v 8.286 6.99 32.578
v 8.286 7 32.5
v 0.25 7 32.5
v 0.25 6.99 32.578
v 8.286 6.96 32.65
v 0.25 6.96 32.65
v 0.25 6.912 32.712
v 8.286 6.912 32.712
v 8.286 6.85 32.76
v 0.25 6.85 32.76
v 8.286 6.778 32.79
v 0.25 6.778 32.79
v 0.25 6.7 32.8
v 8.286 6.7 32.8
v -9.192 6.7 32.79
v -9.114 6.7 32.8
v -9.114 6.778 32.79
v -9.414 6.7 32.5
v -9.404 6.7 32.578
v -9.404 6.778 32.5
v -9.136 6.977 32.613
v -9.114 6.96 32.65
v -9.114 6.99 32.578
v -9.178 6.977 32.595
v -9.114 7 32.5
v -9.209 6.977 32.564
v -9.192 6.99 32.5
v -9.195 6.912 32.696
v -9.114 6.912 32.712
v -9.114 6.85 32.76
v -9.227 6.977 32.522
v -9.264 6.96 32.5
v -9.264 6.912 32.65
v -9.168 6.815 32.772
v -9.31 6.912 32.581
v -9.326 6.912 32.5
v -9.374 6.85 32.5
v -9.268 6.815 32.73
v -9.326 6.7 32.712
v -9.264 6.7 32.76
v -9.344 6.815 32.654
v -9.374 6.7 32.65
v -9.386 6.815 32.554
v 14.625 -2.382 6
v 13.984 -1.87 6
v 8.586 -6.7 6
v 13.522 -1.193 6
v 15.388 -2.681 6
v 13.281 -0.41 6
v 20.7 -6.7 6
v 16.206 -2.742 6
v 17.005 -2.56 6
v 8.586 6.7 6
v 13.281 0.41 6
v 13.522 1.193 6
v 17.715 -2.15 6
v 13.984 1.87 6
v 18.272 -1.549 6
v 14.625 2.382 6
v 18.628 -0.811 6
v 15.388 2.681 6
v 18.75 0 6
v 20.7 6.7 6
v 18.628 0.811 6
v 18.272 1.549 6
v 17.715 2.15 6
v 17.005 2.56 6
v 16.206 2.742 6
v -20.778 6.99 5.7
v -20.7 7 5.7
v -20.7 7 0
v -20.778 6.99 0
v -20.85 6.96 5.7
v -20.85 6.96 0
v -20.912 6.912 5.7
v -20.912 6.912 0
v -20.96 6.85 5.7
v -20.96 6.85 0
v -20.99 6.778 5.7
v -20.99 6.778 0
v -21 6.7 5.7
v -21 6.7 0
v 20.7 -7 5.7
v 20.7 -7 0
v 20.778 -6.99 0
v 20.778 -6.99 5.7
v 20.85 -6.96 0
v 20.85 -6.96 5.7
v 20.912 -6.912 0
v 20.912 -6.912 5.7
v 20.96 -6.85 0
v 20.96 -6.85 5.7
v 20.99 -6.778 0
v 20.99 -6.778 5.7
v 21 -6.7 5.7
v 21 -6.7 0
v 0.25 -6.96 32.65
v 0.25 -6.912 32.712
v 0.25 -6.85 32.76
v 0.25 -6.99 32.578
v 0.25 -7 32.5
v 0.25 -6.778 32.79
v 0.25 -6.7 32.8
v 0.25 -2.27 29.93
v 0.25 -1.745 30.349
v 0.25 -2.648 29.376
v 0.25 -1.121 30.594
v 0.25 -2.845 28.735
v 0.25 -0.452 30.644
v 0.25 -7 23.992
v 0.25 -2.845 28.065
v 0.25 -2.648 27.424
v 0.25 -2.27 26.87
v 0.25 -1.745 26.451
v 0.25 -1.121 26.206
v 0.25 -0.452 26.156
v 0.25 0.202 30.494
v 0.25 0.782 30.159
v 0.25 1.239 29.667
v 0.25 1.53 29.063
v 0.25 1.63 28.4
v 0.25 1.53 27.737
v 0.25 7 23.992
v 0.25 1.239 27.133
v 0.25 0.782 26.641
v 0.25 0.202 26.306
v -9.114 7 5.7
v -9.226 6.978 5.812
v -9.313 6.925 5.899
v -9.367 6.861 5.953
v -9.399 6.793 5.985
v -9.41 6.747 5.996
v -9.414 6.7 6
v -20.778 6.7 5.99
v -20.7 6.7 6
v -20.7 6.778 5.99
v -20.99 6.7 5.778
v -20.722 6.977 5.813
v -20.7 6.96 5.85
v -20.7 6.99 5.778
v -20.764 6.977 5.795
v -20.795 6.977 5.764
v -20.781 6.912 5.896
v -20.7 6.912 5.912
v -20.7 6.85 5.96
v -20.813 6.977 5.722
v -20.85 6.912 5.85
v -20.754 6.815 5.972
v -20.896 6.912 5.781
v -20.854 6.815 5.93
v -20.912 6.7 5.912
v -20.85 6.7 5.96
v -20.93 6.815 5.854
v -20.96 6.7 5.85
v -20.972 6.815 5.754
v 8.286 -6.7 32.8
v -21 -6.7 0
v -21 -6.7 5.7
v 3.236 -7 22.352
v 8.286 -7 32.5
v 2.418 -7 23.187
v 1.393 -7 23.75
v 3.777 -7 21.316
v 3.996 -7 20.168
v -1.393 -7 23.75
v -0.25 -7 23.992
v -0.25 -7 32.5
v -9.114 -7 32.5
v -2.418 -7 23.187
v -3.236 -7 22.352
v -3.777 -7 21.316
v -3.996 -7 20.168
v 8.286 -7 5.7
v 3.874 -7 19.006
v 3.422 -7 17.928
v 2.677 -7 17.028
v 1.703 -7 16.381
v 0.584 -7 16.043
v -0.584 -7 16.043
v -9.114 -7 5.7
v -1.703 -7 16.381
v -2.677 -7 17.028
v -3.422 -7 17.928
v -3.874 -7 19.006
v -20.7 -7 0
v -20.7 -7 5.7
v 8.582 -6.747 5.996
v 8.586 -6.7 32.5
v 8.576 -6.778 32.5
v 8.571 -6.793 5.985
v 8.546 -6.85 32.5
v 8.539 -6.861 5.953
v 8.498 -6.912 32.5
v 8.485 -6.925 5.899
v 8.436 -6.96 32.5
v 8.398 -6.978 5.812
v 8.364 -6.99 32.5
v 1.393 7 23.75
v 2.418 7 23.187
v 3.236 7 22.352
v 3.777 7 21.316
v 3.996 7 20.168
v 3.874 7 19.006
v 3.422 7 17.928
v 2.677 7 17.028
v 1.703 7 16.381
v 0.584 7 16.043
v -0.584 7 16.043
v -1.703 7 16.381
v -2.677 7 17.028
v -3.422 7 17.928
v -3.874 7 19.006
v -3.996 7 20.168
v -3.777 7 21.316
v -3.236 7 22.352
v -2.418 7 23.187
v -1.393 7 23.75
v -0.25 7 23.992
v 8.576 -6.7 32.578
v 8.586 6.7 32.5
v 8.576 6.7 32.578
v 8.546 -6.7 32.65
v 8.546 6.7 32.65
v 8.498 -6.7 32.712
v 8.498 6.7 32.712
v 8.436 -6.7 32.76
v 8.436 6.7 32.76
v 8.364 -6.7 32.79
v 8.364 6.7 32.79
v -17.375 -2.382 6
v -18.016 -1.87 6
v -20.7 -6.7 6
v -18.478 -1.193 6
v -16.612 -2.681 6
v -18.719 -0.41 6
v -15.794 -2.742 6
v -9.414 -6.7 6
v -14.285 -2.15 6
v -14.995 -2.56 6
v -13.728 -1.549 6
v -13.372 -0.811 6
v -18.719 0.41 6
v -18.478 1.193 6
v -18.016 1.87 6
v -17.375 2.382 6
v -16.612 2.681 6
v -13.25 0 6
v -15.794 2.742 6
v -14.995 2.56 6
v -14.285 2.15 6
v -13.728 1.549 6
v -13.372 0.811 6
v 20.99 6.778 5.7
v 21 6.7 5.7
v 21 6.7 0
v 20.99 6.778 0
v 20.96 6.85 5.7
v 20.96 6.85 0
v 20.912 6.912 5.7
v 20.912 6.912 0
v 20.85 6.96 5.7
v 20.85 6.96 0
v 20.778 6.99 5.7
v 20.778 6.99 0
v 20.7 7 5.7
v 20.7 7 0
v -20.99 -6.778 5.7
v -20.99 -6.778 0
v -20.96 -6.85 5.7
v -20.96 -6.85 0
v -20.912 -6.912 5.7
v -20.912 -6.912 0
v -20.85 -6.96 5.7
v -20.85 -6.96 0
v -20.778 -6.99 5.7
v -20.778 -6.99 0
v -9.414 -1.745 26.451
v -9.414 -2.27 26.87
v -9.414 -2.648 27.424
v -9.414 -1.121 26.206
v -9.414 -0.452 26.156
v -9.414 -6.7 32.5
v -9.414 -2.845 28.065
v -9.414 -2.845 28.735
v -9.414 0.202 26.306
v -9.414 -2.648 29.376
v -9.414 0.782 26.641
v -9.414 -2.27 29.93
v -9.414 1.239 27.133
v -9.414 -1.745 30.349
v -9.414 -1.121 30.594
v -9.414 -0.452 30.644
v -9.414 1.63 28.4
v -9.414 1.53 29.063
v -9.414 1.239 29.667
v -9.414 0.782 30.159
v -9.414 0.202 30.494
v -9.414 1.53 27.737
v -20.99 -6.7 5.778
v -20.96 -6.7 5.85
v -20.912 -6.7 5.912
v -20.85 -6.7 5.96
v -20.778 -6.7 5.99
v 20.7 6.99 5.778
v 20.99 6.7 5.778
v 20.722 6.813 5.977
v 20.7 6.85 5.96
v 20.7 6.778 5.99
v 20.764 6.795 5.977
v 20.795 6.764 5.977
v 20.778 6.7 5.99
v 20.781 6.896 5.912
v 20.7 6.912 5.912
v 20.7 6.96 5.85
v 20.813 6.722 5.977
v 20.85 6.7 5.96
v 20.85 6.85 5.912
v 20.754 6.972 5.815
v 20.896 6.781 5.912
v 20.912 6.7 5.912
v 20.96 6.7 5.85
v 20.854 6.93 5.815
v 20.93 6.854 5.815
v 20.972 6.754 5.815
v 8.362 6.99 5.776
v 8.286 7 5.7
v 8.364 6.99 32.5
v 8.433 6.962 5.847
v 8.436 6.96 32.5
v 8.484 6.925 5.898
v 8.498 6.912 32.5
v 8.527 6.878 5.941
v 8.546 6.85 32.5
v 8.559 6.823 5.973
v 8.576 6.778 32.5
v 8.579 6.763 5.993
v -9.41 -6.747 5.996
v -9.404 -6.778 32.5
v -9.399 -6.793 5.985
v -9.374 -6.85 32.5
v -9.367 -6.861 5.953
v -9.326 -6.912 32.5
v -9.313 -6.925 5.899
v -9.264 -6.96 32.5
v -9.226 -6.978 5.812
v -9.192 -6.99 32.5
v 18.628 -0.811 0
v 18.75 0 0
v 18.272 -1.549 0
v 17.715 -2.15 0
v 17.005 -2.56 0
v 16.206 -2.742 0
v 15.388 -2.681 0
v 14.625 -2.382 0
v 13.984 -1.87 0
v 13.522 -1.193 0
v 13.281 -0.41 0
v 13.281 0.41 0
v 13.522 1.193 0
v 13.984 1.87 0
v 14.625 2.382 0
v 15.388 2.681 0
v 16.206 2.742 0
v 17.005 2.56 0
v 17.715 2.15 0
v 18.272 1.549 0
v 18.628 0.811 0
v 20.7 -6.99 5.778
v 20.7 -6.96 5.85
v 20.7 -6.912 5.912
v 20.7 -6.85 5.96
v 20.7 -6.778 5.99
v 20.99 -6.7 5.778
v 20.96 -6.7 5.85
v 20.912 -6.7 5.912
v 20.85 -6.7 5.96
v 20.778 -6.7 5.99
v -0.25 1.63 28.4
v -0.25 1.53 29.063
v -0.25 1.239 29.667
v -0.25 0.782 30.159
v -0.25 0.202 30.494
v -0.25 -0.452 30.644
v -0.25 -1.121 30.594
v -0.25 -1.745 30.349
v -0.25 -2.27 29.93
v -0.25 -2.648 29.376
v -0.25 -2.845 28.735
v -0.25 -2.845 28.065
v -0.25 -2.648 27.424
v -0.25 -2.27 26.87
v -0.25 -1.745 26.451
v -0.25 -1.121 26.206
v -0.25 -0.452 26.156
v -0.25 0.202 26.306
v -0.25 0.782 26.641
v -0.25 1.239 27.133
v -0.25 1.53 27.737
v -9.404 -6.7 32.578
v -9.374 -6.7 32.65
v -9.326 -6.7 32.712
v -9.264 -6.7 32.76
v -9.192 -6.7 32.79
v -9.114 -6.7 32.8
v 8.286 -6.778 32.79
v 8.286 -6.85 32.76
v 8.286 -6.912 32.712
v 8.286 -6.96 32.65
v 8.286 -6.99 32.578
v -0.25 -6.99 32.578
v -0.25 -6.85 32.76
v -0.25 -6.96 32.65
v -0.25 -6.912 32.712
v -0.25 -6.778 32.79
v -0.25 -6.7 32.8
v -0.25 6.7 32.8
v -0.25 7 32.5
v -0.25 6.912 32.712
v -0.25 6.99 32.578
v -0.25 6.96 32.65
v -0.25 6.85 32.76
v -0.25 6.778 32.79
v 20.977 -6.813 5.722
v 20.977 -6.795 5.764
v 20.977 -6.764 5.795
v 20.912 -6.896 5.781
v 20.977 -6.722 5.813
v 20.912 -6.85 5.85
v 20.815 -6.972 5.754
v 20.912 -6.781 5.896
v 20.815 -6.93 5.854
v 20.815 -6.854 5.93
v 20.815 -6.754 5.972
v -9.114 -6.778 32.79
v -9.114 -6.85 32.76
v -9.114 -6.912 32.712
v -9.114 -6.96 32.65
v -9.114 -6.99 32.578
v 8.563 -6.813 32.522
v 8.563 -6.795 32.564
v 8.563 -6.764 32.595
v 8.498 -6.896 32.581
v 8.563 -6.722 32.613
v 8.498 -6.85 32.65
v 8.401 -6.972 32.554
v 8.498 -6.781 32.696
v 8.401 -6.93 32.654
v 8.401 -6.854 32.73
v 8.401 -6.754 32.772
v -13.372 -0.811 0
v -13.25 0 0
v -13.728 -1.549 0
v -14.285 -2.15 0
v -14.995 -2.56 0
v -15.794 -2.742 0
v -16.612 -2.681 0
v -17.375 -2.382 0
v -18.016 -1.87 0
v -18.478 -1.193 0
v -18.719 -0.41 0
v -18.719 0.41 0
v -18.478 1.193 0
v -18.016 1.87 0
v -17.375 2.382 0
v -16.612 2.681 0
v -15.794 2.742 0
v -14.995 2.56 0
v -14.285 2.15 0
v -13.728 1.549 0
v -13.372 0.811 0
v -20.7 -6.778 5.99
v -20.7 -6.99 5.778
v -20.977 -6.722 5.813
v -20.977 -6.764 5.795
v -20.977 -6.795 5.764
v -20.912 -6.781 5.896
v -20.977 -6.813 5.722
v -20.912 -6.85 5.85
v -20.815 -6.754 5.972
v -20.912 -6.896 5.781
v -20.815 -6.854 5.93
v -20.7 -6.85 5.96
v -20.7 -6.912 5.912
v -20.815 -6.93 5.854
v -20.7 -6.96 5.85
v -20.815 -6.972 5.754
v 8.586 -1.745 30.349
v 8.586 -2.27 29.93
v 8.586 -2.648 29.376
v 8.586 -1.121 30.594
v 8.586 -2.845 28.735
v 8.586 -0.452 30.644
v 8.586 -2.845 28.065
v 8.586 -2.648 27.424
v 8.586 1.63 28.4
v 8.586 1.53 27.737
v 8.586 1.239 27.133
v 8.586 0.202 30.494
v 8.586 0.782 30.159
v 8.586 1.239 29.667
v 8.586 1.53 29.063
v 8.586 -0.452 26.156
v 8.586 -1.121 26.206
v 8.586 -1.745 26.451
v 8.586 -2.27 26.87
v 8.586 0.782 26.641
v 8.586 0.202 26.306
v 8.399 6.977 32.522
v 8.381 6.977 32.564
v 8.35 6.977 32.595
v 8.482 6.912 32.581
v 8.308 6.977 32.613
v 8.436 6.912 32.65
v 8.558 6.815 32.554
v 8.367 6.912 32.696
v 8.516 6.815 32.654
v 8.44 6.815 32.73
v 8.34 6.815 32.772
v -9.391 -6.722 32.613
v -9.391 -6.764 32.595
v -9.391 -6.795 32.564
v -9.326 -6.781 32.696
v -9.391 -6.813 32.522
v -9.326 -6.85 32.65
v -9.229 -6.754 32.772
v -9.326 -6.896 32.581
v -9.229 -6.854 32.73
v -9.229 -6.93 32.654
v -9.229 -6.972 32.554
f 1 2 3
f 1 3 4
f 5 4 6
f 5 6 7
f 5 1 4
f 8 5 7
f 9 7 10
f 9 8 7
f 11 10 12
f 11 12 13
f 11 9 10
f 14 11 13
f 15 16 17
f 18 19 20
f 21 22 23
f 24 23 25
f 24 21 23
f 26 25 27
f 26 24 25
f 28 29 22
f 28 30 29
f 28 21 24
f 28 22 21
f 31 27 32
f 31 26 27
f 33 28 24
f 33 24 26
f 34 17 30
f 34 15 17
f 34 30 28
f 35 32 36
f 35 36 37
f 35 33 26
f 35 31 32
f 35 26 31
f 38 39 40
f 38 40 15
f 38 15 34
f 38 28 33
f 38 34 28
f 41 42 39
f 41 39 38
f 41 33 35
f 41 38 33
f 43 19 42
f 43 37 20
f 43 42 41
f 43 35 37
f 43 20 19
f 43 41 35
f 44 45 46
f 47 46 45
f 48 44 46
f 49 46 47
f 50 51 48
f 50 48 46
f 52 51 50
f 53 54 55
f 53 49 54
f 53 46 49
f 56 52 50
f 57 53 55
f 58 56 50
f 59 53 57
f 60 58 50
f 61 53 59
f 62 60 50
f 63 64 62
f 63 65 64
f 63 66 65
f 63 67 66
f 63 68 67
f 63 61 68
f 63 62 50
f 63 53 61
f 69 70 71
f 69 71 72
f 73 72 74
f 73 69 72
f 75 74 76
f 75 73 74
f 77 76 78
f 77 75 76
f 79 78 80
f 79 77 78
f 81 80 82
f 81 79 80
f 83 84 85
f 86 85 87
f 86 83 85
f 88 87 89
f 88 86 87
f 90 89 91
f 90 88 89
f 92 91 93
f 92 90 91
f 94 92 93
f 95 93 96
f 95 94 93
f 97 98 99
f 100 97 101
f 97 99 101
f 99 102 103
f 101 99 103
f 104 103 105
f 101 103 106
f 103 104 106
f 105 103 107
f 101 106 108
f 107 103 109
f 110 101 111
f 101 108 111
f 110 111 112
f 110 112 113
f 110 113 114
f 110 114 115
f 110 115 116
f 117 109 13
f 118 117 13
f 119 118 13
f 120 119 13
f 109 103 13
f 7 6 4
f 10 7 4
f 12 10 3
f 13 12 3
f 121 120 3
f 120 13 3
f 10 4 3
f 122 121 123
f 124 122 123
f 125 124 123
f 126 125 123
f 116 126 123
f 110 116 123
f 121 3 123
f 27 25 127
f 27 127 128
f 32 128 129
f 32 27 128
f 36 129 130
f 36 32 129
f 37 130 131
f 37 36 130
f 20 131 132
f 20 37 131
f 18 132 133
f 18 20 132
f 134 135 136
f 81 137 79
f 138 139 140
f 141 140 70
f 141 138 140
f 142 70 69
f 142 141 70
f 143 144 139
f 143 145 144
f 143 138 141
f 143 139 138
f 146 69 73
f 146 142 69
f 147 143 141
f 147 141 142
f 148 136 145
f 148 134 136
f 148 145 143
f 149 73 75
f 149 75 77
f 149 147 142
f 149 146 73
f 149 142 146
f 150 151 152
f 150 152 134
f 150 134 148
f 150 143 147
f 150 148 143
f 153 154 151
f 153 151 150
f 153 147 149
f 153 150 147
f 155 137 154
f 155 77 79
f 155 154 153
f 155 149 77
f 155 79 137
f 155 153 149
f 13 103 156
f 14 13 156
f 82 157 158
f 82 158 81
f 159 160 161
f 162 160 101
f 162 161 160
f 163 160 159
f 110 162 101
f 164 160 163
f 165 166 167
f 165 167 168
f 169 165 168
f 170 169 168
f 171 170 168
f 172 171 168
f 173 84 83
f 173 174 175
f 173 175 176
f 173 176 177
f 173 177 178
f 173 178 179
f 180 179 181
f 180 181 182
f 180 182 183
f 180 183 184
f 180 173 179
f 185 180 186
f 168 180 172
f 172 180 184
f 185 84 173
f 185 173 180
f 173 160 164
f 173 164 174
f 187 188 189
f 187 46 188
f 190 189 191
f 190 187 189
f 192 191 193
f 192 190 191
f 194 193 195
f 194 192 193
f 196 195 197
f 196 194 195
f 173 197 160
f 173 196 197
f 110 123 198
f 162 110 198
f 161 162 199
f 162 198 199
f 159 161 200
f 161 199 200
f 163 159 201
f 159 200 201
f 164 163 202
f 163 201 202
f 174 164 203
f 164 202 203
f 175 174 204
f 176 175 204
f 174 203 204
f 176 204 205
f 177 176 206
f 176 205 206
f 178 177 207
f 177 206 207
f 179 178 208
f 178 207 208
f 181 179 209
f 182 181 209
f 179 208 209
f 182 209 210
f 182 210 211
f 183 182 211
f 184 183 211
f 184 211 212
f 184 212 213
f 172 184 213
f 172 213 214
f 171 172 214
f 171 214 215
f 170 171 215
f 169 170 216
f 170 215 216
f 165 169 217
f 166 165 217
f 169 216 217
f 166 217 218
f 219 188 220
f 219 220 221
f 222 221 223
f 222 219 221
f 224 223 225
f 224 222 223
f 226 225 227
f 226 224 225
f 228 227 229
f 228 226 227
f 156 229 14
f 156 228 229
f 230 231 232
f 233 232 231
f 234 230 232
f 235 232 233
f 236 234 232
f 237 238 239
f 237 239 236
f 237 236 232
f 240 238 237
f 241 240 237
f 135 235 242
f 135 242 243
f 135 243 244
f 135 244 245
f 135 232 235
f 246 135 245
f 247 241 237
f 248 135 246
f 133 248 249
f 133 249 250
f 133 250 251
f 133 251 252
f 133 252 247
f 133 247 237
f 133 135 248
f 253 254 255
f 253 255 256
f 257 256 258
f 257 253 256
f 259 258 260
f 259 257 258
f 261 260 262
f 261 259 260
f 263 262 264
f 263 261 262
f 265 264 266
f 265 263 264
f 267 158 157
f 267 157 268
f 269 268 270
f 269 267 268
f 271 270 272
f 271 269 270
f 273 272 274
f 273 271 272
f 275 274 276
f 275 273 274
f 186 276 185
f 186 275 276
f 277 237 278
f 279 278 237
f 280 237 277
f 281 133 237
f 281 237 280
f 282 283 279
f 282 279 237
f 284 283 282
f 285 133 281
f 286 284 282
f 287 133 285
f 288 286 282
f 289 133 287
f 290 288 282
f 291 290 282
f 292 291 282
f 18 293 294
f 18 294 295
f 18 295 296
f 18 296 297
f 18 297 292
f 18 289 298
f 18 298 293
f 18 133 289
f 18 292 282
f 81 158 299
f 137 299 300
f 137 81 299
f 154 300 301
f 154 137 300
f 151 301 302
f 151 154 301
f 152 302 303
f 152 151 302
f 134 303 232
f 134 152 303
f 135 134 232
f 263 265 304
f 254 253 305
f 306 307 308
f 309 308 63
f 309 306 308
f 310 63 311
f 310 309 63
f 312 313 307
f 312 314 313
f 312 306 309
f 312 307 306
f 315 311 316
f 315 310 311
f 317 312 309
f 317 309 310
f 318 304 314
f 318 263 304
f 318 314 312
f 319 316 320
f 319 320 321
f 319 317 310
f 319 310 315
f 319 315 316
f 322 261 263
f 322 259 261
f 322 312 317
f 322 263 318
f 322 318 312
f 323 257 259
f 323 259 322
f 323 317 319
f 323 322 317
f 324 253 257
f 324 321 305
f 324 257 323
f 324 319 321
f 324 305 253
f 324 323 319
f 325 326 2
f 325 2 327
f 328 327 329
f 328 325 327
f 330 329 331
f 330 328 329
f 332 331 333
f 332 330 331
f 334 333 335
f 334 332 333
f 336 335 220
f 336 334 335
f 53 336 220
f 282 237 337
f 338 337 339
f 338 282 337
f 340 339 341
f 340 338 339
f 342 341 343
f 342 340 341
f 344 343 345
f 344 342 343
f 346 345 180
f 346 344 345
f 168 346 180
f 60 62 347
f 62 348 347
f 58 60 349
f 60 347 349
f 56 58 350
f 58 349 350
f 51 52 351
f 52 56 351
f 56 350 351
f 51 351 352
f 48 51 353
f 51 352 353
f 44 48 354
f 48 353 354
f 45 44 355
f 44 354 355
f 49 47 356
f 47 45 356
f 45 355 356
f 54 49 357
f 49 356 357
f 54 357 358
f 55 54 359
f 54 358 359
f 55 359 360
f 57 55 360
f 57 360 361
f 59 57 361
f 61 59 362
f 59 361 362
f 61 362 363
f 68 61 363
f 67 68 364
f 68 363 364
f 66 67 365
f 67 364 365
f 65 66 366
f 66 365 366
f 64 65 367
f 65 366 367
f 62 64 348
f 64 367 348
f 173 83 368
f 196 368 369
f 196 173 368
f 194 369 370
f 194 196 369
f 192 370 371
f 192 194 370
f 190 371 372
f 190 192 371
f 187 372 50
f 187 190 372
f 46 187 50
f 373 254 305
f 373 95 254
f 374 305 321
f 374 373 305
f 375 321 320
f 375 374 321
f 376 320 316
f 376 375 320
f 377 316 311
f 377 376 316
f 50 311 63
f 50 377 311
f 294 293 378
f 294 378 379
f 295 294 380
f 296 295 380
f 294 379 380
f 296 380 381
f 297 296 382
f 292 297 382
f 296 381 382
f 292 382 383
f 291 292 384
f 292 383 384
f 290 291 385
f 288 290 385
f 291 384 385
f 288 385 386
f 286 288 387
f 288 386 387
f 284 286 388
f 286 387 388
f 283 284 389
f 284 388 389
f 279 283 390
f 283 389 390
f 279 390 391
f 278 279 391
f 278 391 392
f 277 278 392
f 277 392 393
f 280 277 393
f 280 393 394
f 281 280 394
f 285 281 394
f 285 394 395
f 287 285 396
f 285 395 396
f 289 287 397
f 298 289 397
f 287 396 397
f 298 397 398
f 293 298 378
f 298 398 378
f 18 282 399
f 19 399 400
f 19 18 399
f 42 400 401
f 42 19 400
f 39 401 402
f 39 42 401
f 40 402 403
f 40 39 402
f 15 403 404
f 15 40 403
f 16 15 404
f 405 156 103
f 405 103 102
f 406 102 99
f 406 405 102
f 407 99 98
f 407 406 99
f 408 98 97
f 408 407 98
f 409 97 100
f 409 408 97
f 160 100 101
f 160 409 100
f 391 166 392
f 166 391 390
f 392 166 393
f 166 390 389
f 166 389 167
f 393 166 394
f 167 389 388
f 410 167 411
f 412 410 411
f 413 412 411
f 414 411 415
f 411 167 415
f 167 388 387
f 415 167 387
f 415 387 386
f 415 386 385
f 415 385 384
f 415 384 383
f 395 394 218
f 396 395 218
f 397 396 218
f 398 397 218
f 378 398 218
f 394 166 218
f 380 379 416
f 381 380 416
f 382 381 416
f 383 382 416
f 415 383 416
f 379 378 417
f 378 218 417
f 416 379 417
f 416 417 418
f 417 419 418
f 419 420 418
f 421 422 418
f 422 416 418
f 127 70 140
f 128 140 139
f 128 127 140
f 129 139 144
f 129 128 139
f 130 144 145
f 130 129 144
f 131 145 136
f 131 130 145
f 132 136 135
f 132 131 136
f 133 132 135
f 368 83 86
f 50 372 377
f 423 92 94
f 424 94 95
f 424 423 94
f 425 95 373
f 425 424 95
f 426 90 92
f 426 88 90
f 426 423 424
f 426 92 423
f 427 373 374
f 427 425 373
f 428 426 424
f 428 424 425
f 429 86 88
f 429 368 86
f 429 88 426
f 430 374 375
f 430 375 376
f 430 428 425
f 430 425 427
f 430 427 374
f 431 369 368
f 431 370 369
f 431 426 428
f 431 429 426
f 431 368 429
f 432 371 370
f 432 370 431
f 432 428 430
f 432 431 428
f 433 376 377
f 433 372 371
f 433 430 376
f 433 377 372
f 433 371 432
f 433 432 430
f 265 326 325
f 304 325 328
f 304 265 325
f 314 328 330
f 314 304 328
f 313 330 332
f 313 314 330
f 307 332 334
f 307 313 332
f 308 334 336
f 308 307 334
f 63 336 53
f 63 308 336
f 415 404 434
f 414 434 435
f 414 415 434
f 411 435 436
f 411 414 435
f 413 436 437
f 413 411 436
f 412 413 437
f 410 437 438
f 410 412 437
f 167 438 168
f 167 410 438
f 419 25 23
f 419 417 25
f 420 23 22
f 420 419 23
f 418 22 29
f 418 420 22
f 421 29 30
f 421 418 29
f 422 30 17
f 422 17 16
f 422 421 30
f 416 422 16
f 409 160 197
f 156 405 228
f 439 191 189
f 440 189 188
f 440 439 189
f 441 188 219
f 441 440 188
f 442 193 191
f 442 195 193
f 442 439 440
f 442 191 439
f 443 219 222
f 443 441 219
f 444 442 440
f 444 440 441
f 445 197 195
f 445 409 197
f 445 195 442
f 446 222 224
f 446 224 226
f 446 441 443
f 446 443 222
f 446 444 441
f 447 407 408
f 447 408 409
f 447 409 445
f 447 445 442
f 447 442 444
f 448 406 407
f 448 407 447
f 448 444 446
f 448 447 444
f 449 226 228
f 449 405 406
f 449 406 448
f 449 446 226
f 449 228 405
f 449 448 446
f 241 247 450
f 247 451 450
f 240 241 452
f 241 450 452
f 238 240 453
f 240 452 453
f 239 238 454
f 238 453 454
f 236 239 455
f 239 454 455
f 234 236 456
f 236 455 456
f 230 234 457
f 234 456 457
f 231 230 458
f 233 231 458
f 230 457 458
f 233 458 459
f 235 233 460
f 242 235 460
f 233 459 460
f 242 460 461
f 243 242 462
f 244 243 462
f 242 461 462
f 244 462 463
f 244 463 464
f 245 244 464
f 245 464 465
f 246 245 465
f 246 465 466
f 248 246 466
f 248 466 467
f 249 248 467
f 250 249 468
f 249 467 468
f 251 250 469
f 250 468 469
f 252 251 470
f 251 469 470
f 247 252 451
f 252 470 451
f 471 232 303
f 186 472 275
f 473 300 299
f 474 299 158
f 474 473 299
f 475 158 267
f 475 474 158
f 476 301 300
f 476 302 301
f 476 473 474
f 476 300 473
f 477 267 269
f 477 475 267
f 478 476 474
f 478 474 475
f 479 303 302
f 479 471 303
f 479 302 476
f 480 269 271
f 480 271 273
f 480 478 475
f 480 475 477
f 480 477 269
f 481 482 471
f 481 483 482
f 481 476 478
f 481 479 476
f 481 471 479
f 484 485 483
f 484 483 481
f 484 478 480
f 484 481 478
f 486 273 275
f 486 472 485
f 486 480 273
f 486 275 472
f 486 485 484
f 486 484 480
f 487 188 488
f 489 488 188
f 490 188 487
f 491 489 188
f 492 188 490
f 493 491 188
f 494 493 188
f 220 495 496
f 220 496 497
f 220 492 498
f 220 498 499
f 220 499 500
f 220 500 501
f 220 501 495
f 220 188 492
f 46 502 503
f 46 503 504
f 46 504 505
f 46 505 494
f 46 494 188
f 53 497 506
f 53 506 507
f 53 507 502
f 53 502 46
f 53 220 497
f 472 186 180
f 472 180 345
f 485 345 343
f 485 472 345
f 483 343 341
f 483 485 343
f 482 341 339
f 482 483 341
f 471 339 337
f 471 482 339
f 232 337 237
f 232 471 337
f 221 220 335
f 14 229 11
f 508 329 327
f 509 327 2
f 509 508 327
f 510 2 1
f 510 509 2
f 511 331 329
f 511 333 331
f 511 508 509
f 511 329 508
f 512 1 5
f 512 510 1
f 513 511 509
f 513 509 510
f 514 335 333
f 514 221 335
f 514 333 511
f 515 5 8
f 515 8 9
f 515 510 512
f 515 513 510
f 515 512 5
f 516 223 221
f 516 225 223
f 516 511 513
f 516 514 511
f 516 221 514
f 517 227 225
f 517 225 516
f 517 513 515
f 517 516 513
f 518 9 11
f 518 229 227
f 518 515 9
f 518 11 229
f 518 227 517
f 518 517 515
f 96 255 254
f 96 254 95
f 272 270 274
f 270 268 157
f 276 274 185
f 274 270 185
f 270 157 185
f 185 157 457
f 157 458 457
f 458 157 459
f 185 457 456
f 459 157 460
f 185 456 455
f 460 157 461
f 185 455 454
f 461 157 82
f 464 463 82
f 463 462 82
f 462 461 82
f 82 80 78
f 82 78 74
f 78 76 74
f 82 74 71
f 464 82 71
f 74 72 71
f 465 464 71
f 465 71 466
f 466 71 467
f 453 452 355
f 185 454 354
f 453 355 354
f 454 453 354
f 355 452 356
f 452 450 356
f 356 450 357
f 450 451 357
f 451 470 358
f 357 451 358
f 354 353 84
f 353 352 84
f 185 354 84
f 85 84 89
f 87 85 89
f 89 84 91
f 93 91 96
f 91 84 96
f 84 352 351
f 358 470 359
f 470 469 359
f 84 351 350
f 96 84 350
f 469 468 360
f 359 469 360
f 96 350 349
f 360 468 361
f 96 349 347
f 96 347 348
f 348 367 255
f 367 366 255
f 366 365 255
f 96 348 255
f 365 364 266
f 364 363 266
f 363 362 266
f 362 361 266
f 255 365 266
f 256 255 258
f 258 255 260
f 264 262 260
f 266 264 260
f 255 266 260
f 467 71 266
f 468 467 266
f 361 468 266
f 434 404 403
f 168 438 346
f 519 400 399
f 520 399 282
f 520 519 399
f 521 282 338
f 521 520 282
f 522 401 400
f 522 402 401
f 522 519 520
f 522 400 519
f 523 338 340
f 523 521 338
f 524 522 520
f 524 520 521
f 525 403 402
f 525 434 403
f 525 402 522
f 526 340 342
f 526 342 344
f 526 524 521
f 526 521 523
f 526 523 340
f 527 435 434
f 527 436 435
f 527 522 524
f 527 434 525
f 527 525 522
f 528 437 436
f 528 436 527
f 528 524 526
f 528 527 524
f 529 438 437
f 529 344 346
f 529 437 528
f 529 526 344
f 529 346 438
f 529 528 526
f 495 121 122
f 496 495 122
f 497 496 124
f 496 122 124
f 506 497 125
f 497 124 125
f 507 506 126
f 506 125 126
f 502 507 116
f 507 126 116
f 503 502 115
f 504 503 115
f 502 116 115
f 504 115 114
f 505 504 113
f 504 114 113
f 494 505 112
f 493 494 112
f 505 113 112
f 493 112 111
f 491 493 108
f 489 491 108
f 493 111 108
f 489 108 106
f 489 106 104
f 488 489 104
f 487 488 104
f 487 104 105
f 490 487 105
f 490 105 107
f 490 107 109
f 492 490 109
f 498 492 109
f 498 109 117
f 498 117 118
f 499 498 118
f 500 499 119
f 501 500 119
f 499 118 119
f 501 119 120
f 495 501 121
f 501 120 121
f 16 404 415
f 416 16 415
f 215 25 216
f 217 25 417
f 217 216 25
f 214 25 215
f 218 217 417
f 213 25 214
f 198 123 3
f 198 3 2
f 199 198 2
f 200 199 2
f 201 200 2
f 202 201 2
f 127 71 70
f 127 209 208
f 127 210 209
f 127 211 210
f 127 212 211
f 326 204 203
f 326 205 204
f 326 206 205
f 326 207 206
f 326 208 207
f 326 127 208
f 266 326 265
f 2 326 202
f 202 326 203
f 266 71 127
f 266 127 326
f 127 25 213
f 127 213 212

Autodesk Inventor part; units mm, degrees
ref_plane "YZ Plane" through (0, 0, 0) normal (1, 0, 0) x (0, 1, 0)
ref_plane "XZ Plane" through (0, 0, 0) normal (0, 1, 0) x (-1, 0, 0)
ref_plane "XY Plane" through (0, 0, 0) normal (0, 0, 1) x (1, 0, 0)
sketch "Boceto1" plane through (0, 0, 0) normal (0, 0, 1) x (1, 0, 0)
  line L0 (-19.271, 0) -> (-1.6402, 0)
  circle A0 centre (-16, 0) radius 2.75
  circle A1 centre (16, 0) radius 2.75
  line L1 (21, -7) -> (-21, -7)
  line L2 (-21, -7) -> (-21, 7)
  line L3 (-21, 7) -> (21, 7)
  line L4 (21, 7) -> (21, -7)
  line L5 (21, -7) -> (-21, 7) construction
  line L6 (-21, -7) -> (21, 7) construction
  point P0 (0, 0)
  point P1 (0, 0)
  dimension "d0" = 5.5
  dimension "d1" = 5.5
  dimension "d2" = 16
  dimension "d3" = 32
  dimension "d4" = 14
  dimension "d5" = 42
extrude "Extrusión1" add sketch "Boceto1" along normal blind 6
sketch "Boceto2" plane through (0, 0, 6) normal (0, 0, 1) x (1, 0, 0)
  point P0 (0, 0)
sketch "Boceto3" plane through (0, 0, 0) normal (0, 1, 0) x (-1, 0, 0)
  line L0 (-21, 0) -> (21, 0) projected
  line L1 (-8.586, 32.8) -> (-8.586, 0)
  line L2 (-8.586, 0) -> (9.414, 0)
  line L3 (9.414, 0) -> (9.414, 32.8)
  arc A0 (-0.25, 23.9922) -> (0.25, 23.9922) centre (0, 20) ccw
  line L4 (0.25, 36.8) -> (-0.25, 36.8)
  line L5 (-0.25, 32.8) -> (-0.25, 22.8)
  line L6 (-0.25, 22.8) -> (0.25, 22.8)
  line L7 (0.25, 22.8) -> (0.25, 32.8)
  line L8 (0.25, 36.8) -> (-0.25, 22.8) construction
  line L9 (-0.25, 36.8) -> (0.25, 22.8) construction
  line L10 (9.414, 32.8) -> (0.25, 32.8)
  line L11 (-0.25, 32.8) -> (-8.586, 32.8)
  point P0 (0, 0)
  dimension "d8" = 32.8
  dimension "d9" = 8
  dimension "d10" = 20
  dimension "d12" = 18
  dimension "d13" = 0.5
  dimension "d14" = 14
extrude "Extrusión2" add sketch "Boceto3" against normal mid plane 14 contours L1 L11 L5 A0 L7 L10 L3 L0
fillet "Empalme1" radius 0.3 20 edges at (-4.832, -7, 32.8) (4.418, -7, 32.8) (-15.207, -7, 6) (14.793, -7, 6) (-21, 0, 6) (-21, 7, 3) (-21, -7, 3) (21, -7, 3) (21, 7, 3) (14.793, 7, 6) (21, 0, 6) (-15.207, 7, 6) (8.586, 0, 32.8) (-9.414, 0, 32.8) (8.586, 7, 19.4) (-9.414, 7, 19.4) (8.586, -7, 19.4) (-9.414, -7, 19.4) (-4.832, 7, 32.8) (4.418, 7, 32.8)
sketch "Boceto5" plane through (0, 0, 0) normal (1, 0, 0) x (0, 1, 0)
  circle A0 centre (-0.6204, 28.4) radius 2.25
  line L0 (6.7, 0) -> (-6.7, 0) projected
  point P0 (0, 0)
  dimension "d18" = 4.5
  dimension "d19" = 28.4
extrude "Extrusión3" cut sketch "Boceto5" along normal mid plane 20
properties part number "SK8_LinearShaftSupport" material "Aluminum 6061"
